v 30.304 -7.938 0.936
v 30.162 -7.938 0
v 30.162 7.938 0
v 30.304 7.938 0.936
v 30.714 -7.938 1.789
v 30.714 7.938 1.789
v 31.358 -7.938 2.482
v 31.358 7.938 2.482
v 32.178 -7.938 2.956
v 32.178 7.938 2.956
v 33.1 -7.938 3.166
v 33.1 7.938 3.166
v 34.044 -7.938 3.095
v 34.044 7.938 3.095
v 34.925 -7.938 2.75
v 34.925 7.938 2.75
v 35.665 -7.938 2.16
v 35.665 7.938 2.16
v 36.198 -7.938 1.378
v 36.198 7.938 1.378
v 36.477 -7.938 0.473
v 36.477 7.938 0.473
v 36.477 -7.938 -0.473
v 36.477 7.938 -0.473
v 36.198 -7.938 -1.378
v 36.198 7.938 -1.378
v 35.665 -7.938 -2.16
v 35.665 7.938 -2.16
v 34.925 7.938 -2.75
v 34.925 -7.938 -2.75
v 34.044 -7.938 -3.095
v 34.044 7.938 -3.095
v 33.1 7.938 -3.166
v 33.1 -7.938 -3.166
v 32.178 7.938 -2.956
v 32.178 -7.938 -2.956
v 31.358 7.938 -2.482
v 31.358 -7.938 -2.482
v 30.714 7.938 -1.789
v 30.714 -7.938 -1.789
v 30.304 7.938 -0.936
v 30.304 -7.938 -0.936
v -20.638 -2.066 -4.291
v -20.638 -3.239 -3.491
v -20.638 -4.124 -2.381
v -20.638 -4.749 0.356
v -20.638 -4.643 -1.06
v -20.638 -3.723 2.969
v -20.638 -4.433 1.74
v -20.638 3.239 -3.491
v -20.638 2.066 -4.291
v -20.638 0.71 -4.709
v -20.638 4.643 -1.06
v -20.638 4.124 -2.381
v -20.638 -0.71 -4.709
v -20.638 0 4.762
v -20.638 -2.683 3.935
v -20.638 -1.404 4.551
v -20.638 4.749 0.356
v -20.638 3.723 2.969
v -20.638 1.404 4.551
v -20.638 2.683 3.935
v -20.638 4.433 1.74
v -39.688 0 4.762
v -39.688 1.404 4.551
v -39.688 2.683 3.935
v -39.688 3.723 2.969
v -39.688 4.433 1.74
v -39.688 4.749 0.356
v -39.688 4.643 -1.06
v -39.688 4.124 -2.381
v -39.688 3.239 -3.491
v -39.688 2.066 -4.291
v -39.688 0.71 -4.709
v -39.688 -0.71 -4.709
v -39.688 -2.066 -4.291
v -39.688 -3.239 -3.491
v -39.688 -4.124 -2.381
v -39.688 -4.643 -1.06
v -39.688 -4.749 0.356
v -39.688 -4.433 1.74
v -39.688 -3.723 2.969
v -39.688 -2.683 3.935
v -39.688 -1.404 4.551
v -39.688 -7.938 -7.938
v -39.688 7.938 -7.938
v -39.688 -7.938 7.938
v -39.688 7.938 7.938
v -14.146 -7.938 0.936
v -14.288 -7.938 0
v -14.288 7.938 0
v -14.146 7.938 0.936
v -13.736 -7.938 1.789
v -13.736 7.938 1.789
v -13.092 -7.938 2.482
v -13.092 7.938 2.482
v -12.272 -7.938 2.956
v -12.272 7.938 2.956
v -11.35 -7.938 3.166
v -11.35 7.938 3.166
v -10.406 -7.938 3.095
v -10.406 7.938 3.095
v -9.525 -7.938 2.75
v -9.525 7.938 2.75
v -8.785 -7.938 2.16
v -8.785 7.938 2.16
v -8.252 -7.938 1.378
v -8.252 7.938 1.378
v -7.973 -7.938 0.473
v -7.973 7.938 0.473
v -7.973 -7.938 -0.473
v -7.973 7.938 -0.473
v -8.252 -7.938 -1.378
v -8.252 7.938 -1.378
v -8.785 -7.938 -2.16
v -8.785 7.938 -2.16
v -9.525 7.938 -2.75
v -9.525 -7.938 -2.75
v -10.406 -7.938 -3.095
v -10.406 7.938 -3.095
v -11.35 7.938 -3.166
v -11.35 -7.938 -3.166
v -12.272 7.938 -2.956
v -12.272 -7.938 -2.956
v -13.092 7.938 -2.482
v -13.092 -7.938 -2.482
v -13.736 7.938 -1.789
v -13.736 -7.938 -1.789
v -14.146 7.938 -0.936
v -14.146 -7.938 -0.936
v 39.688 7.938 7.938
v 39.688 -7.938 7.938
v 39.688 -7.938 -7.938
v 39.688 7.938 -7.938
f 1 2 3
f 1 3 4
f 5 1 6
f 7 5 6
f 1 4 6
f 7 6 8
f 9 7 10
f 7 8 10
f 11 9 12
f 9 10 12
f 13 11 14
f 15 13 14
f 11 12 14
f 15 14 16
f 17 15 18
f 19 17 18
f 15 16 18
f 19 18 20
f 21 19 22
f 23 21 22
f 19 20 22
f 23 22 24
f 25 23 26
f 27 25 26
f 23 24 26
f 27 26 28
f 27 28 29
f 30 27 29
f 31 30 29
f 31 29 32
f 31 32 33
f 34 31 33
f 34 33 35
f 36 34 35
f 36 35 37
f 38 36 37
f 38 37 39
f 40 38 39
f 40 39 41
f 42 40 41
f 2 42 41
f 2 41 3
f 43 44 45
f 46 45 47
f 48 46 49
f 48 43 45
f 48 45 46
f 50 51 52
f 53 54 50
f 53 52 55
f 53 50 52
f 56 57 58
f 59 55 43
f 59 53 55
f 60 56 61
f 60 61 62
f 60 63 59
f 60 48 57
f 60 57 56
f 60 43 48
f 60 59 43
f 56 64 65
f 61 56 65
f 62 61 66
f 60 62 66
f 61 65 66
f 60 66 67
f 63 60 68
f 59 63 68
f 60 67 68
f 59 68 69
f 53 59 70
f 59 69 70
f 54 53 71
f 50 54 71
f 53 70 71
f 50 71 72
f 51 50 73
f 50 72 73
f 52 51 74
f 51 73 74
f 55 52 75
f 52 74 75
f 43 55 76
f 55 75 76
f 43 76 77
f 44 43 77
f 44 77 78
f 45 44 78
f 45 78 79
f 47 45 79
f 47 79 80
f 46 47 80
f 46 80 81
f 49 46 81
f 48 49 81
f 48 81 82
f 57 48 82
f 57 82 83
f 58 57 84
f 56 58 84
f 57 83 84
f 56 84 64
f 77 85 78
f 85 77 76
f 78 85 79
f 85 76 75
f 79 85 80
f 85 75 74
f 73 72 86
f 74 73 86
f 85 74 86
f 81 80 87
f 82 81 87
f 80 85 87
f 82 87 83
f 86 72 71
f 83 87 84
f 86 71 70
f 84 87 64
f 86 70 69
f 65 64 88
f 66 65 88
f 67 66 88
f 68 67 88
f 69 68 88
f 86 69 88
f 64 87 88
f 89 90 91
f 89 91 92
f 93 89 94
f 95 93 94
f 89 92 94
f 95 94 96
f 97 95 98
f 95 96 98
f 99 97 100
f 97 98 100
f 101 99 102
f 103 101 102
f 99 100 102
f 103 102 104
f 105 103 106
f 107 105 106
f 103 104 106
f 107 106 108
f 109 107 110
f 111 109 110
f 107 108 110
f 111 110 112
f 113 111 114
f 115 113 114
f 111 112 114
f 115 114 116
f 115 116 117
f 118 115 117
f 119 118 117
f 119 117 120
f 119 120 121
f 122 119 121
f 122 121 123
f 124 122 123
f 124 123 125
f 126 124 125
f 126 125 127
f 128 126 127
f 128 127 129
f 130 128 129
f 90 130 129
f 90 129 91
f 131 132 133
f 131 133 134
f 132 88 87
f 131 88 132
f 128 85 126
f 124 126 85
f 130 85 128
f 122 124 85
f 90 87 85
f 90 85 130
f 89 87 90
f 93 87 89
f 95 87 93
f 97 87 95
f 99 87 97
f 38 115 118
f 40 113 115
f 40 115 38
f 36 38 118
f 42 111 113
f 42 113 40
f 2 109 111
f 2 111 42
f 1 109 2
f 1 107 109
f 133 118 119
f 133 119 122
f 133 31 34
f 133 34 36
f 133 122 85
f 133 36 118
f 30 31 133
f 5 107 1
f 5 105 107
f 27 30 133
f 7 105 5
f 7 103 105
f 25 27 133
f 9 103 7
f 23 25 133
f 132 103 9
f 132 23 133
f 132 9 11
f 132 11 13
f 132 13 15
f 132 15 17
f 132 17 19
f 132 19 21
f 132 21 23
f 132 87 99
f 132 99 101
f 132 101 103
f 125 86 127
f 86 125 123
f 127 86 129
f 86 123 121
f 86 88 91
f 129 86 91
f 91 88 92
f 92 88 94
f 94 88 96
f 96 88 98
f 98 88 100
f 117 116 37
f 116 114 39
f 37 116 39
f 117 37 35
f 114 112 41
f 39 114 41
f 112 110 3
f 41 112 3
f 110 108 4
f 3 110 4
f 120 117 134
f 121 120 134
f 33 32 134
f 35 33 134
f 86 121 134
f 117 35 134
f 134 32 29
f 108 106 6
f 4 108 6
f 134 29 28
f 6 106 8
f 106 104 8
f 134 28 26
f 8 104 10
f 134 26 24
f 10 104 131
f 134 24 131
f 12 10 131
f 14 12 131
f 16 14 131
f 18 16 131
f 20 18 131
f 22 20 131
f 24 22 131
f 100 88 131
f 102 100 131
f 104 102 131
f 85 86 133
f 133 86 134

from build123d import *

# Parameters (mm, degrees)
SKETCH1_W           = 79.375
SKETCH1_H           = 15.875
BOSS_EXTRUDE1_DEPTH = 7.9375
SKETCH2_R           = 4.7625
CUT_EXTRUDE1_DEPTH  = 19.05
SKETCH3_R           = 3.175
CUT_EXTRUDE2_DEPTH  = 44.475478002


with BuildPart() as part:
    # Sketch1 → Boss-Extrude1 (new, symmetric)
    with BuildSketch(Plane.XY):
        Rectangle(SKETCH1_W, SKETCH1_H)
    extrude(amount=BOSS_EXTRUDE1_DEPTH, both=True)

    # Sketch2 → Cut-Extrude1 (cut)
    with BuildSketch(Plane.ZY.offset(39.6875)):
        Circle(SKETCH2_R)
    extrude(amount=-CUT_EXTRUDE1_DEPTH, mode=Mode.SUBTRACT)

    # Sketch3 → Cut-Extrude2 (cut, through all)
    with BuildSketch(Plane(origin=(0, 7.9375, 0), x_dir=(1, 0, 0), z_dir=(0, 1, 0))):
        with Locations(Location((33.3375, 0, 0), (0, 0, 180))):
            Circle(SKETCH3_R)
        with Locations(Location((-11.1125, 0, 0), (0, 0, 180))):
            Circle(SKETCH3_R)
    extrude(amount=-CUT_EXTRUDE2_DEPTH, mode=Mode.SUBTRACT)


solid = part.part
